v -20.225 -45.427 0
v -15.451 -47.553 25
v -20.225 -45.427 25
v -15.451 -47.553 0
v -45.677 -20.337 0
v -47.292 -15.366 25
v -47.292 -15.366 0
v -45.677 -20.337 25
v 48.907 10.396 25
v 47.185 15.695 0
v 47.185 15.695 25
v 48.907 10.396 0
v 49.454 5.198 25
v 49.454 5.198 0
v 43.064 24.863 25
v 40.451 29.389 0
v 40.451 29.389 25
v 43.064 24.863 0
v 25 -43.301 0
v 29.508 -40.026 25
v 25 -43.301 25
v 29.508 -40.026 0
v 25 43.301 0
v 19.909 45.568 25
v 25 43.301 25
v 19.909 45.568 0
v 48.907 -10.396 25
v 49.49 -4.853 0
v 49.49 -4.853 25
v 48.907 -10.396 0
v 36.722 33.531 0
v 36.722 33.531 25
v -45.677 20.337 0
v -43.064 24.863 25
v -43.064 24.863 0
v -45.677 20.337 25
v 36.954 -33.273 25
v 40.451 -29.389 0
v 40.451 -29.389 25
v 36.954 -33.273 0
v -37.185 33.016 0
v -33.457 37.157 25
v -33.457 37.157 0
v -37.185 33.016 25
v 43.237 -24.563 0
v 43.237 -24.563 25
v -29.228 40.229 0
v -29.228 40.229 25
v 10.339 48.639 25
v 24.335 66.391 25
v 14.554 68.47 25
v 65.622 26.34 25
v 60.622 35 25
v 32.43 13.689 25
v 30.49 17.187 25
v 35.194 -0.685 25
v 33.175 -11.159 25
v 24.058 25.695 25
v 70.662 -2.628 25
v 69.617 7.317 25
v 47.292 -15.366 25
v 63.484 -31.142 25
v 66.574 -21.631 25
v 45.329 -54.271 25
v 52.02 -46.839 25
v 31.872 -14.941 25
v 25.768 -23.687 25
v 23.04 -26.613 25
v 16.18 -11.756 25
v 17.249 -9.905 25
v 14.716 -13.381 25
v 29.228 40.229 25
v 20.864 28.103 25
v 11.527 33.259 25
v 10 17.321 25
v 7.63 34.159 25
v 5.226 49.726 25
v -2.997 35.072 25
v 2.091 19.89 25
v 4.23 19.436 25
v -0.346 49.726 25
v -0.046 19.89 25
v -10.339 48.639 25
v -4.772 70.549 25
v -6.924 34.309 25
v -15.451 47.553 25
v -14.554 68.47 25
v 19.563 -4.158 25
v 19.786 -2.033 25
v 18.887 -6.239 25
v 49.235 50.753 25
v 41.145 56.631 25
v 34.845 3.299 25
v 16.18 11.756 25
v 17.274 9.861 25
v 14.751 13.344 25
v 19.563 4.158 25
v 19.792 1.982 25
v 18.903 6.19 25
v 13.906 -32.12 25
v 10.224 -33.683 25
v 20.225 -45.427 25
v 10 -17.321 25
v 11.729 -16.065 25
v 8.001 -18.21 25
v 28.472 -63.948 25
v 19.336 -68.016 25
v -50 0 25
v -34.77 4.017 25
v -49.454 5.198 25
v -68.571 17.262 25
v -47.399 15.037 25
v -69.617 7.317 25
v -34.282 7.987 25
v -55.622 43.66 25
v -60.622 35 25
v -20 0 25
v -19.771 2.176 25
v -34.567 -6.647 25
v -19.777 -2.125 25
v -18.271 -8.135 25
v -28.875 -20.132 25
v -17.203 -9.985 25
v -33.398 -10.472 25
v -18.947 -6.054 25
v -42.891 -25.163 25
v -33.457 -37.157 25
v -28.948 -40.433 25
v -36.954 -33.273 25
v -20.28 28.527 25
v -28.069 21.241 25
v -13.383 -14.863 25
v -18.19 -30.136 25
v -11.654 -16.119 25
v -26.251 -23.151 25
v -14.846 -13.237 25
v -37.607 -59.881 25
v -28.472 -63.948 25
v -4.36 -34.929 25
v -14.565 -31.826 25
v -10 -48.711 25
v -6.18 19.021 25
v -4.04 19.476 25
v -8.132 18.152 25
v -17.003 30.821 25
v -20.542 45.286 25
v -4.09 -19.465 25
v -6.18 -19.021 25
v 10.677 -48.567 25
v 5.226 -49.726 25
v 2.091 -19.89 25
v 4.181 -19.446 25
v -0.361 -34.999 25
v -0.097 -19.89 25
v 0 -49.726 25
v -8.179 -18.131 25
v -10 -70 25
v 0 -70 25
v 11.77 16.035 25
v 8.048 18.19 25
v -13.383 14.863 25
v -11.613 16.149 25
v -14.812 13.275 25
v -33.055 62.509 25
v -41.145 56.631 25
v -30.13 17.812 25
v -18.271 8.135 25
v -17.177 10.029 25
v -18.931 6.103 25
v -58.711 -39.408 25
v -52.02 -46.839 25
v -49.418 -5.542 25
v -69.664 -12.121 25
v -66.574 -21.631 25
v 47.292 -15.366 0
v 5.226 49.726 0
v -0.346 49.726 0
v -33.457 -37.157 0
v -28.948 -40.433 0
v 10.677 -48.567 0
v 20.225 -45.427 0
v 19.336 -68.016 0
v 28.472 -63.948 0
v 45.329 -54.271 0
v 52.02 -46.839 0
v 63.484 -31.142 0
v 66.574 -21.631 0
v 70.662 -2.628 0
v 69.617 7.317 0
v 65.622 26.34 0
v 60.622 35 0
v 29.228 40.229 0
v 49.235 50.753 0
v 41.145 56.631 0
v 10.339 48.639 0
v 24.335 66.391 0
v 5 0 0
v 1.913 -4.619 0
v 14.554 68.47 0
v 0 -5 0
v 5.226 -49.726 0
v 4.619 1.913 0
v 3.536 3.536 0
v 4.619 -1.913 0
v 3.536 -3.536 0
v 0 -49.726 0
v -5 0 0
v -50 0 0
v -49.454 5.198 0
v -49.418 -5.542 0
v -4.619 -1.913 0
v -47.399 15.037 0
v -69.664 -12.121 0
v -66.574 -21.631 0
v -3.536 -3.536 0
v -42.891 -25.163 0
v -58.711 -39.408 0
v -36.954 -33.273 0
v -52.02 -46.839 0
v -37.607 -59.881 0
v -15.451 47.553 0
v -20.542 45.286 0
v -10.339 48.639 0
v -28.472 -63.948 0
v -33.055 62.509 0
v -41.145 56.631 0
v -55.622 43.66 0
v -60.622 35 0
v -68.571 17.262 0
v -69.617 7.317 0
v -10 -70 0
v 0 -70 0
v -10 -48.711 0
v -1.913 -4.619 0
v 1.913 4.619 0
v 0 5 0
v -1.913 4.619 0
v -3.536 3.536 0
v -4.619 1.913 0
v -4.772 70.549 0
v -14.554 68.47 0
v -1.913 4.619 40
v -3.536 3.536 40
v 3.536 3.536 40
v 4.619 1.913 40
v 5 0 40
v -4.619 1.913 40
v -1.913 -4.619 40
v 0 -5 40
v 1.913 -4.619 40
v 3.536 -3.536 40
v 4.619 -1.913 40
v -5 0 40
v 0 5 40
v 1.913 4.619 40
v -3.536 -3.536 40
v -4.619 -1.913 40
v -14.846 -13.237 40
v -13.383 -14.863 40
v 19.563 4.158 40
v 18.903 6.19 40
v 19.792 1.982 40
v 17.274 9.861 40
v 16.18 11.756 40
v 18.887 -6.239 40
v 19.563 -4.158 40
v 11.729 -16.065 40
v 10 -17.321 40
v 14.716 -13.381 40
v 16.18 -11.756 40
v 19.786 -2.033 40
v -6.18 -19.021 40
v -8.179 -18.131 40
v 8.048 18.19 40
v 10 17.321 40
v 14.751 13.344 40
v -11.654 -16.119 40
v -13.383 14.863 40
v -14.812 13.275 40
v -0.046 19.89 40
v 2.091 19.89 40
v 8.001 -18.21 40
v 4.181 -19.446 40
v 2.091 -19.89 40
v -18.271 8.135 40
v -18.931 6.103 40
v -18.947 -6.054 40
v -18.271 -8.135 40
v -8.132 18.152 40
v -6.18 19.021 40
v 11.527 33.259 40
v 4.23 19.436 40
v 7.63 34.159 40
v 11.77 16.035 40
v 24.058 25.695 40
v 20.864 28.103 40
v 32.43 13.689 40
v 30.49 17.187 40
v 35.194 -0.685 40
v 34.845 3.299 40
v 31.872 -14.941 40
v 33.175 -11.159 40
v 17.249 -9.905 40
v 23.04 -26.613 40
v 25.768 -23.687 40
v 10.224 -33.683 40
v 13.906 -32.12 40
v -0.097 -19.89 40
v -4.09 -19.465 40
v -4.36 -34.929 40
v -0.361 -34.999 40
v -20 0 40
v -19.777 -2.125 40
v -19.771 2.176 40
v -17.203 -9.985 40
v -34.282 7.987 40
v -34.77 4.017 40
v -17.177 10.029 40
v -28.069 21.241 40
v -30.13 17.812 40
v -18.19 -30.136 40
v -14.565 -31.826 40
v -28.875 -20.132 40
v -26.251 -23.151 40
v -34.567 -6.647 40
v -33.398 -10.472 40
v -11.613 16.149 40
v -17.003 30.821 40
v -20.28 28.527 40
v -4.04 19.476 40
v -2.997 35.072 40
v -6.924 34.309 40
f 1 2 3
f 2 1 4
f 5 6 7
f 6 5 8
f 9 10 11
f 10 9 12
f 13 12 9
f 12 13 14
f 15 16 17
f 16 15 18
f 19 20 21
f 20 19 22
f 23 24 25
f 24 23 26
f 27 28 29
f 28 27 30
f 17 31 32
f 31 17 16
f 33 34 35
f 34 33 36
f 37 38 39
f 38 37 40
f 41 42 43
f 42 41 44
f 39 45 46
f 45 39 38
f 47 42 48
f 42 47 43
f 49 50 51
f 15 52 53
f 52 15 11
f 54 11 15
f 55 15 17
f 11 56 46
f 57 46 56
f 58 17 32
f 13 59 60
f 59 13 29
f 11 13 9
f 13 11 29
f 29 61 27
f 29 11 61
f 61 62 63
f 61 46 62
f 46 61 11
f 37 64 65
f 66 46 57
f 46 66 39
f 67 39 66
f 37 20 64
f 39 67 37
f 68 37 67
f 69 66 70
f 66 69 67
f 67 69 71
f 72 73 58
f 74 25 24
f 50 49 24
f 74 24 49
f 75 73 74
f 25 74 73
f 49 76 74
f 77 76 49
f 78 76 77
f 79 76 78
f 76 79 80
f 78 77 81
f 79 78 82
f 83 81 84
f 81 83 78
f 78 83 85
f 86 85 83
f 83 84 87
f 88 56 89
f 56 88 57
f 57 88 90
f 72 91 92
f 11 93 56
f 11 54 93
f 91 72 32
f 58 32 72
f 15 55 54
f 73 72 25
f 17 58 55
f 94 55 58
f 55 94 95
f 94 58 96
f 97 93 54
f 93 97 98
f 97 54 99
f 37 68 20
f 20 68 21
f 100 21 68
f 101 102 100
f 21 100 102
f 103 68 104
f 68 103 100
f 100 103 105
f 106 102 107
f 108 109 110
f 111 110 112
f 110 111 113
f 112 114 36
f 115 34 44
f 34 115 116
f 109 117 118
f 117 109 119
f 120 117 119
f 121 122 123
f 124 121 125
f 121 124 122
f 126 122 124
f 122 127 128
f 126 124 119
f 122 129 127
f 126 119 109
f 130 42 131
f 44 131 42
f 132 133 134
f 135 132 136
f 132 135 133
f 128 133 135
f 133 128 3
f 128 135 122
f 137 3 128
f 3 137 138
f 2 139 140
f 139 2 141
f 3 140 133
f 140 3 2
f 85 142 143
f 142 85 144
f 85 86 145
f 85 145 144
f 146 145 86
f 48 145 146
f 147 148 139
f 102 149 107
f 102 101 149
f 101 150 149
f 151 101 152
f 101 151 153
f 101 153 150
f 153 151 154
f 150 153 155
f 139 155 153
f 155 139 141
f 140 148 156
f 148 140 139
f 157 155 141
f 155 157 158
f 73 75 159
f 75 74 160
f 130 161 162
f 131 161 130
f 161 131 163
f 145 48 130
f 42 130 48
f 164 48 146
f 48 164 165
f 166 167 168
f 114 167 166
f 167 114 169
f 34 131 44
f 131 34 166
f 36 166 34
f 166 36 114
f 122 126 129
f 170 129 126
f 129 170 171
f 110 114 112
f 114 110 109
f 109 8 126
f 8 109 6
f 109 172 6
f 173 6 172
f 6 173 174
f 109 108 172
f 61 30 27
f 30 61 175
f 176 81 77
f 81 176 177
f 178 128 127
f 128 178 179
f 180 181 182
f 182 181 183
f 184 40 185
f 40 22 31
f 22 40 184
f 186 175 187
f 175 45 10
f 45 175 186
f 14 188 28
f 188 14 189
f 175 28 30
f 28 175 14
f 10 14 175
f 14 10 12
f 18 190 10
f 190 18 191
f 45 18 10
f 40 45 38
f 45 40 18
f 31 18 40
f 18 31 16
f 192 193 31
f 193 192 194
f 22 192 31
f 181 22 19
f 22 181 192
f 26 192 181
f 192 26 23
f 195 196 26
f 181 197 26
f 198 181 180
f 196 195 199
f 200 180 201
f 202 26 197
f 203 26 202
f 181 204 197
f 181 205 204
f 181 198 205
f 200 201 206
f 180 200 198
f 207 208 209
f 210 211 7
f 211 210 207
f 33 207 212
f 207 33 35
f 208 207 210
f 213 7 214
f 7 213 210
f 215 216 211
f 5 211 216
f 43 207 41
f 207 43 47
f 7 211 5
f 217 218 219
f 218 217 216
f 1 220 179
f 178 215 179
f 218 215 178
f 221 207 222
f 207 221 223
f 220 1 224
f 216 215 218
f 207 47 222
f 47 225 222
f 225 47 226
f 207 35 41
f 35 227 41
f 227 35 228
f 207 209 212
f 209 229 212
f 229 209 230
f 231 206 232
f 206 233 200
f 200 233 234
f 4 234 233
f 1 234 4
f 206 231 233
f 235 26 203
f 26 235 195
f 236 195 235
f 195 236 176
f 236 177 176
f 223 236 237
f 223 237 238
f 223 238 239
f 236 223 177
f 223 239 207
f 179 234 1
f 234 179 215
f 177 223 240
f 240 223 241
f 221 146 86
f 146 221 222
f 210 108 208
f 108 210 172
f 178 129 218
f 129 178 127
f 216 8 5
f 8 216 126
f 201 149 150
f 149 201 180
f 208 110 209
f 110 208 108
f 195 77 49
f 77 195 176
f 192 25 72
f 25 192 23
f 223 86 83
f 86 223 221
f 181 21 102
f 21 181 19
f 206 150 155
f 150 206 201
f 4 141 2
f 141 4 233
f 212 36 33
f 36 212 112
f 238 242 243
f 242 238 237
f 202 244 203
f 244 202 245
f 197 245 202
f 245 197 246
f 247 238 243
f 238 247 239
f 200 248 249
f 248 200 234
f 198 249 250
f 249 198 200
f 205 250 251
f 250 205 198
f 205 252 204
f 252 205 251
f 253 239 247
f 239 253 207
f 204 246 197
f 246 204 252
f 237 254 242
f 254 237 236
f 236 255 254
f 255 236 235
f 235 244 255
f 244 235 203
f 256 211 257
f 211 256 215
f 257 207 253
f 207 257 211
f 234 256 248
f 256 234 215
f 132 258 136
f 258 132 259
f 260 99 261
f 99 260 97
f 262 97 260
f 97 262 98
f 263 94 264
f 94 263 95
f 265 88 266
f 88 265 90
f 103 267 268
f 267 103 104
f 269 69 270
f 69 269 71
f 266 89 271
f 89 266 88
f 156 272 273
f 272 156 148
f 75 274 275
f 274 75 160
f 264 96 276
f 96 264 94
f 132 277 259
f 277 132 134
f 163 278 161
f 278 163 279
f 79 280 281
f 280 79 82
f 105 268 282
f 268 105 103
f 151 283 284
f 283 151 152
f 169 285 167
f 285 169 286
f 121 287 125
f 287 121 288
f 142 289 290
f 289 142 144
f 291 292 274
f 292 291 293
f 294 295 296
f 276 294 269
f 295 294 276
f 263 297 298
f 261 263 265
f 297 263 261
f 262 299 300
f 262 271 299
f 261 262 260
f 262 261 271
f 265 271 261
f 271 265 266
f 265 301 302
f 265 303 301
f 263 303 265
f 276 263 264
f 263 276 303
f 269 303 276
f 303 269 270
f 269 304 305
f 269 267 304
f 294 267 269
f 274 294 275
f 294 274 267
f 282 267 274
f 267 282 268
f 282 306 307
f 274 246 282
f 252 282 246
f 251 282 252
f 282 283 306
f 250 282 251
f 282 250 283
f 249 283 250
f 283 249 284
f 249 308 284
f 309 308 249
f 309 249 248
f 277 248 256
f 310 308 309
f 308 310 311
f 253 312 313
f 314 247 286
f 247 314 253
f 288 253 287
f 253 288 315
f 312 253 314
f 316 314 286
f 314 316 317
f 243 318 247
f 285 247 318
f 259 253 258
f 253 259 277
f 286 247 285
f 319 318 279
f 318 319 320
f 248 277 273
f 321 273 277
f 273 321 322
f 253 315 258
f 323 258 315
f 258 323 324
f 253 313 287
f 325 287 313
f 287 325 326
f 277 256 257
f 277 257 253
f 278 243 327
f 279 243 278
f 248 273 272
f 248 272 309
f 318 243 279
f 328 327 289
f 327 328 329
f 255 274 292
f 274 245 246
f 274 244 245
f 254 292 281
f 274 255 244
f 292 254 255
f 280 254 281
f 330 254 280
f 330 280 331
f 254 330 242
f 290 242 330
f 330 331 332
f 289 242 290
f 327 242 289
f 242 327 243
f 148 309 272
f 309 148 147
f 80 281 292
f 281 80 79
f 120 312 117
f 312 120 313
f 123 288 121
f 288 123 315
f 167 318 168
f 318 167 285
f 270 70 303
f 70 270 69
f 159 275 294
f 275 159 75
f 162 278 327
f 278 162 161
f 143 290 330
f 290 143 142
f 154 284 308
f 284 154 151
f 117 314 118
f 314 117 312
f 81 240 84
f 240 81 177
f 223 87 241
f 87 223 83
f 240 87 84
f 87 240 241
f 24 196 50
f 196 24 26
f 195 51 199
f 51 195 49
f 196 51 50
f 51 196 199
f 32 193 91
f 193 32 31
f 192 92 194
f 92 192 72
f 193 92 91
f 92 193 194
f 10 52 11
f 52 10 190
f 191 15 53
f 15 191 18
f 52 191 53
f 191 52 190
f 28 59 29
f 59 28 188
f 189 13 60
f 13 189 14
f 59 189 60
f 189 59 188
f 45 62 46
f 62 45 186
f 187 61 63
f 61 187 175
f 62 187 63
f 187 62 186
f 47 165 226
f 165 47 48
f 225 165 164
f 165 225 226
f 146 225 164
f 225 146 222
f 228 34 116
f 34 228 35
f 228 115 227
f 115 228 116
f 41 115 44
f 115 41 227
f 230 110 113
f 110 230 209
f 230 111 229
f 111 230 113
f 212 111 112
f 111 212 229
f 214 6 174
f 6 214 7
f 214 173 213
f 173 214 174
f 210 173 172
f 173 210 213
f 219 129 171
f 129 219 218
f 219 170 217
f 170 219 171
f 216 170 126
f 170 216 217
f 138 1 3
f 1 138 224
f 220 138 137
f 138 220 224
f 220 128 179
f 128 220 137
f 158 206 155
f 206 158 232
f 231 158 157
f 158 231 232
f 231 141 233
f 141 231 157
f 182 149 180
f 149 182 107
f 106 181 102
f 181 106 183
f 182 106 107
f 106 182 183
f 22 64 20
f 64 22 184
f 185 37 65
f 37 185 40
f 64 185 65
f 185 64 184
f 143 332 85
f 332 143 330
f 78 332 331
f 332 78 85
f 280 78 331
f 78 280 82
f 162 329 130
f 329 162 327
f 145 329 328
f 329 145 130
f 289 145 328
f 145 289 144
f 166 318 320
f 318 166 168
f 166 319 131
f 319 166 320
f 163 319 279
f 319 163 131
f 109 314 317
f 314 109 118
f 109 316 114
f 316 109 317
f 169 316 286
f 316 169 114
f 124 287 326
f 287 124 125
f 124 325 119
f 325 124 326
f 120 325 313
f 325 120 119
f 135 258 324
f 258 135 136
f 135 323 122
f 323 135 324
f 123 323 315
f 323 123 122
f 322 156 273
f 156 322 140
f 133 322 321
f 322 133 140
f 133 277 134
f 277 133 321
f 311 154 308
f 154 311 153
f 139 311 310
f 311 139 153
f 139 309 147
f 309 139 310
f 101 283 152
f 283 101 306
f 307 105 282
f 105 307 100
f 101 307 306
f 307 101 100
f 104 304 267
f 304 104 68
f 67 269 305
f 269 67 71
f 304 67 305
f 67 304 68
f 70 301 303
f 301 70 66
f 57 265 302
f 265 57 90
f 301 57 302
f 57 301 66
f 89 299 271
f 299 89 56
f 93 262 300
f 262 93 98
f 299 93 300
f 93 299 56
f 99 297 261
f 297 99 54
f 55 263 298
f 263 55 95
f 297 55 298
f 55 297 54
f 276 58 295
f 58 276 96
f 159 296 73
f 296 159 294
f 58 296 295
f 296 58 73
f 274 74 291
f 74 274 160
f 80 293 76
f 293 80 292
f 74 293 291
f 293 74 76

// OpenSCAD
difference(){ 
cylinder(h=25,r=50);

translate([0,0,-3])
cylinder(h=30,r=5);
}
difference(){ 
cylinder(h=40,r=20);

translate([0,0,-3])
cylinder(h=50,r=5);
}

rotate([0,0,12])
translate([0,45,0]) 
cube([10,25,25]);
rotate([0,0,-12,])
translate([0,45,0]) 
cube([10,25,25]);
rotate([0,0,-36,])
translate([0,45,0]) 
cube([10,25,25]);
rotate([0,0,-60,])
translate([0,45,0]) 
cube([10,25,25]);
rotate([0,0,-84,])
translate([0,45,0]) 
cube([10,25,25]);
rotate([0,0,-108,])
translate([0,45,0]) 
cube([10,25,25]);
rotate([0,0,36,])
translate([0,45,0]) 
cube([10,25,25]);
rotate([0,0,60,])
translate([0,45,0]) 
cube([10,25,25]);
rotate([0,0,84,])
translate([0,45,0]) 
cube([10,25,25]);
rotate([0,0,108,])
translate([0,45,0]) 
cube([10,25,25]);
rotate([0,0,132,])
translate([0,45,0]) 
cube([10,25,25]);
rotate([0,0,156,])
translate([0,45,0]) 
cube([10,25,25]);
rotate([0,0,180,])
translate([0,45,0]) 
cube([10,25,25]);
rotate([0,0,204,])
translate([0,45,0]) 
cube([10,25,25]);
rotate([0,0,228,])
translate([0,45,0]) 
cube([10,25,25]);

rotate([0,0,11])
translate([-.25,15,0]) 
cube([4,20,40]);
rotate([0,0,35])
translate([-.25,15,0]) 
cube([4,20,40]);
rotate([0,0,59])
translate([-.25,15,0]) 
cube([4,20,40]);
rotate([0,0,83])
translate([-.25,15,0]) 
cube([4,20,40]);
rotate([0,0,107])
translate([-.25,15,0]) 
cube([4,20,40]);
rotate([0,0,131])
translate([-.25,15,0]) 
cube([4,20,40]);
rotate([0,0,155])
translate([-.25,15,0]) 
cube([4,20,40]);
rotate([0,0,179])
translate([-.25,15,0]) 
cube([4,20,40]);
rotate([0,0,203])
translate([-.25,15,0]) 
cube([4,20,40]);
rotate([0,0,227])
translate([-.25,15,0]) 
cube([4,20,40]);
rotate([0,0,251])
translate([-.25,15,0]) 
cube([4,20,40]);
rotate([0,0,275])
translate([-.25,15,0]) 
cube([4,20,40]);
rotate([0,0,299])
translate([-.25,15,0]) 
cube([4,20,40]);
rotate([0,0,323])
translate([-.25,15,0]) 
cube([4,20,40]);
rotate([0,0,347])
translate([-.25,15,0]) 
cube([4,20,40]);
